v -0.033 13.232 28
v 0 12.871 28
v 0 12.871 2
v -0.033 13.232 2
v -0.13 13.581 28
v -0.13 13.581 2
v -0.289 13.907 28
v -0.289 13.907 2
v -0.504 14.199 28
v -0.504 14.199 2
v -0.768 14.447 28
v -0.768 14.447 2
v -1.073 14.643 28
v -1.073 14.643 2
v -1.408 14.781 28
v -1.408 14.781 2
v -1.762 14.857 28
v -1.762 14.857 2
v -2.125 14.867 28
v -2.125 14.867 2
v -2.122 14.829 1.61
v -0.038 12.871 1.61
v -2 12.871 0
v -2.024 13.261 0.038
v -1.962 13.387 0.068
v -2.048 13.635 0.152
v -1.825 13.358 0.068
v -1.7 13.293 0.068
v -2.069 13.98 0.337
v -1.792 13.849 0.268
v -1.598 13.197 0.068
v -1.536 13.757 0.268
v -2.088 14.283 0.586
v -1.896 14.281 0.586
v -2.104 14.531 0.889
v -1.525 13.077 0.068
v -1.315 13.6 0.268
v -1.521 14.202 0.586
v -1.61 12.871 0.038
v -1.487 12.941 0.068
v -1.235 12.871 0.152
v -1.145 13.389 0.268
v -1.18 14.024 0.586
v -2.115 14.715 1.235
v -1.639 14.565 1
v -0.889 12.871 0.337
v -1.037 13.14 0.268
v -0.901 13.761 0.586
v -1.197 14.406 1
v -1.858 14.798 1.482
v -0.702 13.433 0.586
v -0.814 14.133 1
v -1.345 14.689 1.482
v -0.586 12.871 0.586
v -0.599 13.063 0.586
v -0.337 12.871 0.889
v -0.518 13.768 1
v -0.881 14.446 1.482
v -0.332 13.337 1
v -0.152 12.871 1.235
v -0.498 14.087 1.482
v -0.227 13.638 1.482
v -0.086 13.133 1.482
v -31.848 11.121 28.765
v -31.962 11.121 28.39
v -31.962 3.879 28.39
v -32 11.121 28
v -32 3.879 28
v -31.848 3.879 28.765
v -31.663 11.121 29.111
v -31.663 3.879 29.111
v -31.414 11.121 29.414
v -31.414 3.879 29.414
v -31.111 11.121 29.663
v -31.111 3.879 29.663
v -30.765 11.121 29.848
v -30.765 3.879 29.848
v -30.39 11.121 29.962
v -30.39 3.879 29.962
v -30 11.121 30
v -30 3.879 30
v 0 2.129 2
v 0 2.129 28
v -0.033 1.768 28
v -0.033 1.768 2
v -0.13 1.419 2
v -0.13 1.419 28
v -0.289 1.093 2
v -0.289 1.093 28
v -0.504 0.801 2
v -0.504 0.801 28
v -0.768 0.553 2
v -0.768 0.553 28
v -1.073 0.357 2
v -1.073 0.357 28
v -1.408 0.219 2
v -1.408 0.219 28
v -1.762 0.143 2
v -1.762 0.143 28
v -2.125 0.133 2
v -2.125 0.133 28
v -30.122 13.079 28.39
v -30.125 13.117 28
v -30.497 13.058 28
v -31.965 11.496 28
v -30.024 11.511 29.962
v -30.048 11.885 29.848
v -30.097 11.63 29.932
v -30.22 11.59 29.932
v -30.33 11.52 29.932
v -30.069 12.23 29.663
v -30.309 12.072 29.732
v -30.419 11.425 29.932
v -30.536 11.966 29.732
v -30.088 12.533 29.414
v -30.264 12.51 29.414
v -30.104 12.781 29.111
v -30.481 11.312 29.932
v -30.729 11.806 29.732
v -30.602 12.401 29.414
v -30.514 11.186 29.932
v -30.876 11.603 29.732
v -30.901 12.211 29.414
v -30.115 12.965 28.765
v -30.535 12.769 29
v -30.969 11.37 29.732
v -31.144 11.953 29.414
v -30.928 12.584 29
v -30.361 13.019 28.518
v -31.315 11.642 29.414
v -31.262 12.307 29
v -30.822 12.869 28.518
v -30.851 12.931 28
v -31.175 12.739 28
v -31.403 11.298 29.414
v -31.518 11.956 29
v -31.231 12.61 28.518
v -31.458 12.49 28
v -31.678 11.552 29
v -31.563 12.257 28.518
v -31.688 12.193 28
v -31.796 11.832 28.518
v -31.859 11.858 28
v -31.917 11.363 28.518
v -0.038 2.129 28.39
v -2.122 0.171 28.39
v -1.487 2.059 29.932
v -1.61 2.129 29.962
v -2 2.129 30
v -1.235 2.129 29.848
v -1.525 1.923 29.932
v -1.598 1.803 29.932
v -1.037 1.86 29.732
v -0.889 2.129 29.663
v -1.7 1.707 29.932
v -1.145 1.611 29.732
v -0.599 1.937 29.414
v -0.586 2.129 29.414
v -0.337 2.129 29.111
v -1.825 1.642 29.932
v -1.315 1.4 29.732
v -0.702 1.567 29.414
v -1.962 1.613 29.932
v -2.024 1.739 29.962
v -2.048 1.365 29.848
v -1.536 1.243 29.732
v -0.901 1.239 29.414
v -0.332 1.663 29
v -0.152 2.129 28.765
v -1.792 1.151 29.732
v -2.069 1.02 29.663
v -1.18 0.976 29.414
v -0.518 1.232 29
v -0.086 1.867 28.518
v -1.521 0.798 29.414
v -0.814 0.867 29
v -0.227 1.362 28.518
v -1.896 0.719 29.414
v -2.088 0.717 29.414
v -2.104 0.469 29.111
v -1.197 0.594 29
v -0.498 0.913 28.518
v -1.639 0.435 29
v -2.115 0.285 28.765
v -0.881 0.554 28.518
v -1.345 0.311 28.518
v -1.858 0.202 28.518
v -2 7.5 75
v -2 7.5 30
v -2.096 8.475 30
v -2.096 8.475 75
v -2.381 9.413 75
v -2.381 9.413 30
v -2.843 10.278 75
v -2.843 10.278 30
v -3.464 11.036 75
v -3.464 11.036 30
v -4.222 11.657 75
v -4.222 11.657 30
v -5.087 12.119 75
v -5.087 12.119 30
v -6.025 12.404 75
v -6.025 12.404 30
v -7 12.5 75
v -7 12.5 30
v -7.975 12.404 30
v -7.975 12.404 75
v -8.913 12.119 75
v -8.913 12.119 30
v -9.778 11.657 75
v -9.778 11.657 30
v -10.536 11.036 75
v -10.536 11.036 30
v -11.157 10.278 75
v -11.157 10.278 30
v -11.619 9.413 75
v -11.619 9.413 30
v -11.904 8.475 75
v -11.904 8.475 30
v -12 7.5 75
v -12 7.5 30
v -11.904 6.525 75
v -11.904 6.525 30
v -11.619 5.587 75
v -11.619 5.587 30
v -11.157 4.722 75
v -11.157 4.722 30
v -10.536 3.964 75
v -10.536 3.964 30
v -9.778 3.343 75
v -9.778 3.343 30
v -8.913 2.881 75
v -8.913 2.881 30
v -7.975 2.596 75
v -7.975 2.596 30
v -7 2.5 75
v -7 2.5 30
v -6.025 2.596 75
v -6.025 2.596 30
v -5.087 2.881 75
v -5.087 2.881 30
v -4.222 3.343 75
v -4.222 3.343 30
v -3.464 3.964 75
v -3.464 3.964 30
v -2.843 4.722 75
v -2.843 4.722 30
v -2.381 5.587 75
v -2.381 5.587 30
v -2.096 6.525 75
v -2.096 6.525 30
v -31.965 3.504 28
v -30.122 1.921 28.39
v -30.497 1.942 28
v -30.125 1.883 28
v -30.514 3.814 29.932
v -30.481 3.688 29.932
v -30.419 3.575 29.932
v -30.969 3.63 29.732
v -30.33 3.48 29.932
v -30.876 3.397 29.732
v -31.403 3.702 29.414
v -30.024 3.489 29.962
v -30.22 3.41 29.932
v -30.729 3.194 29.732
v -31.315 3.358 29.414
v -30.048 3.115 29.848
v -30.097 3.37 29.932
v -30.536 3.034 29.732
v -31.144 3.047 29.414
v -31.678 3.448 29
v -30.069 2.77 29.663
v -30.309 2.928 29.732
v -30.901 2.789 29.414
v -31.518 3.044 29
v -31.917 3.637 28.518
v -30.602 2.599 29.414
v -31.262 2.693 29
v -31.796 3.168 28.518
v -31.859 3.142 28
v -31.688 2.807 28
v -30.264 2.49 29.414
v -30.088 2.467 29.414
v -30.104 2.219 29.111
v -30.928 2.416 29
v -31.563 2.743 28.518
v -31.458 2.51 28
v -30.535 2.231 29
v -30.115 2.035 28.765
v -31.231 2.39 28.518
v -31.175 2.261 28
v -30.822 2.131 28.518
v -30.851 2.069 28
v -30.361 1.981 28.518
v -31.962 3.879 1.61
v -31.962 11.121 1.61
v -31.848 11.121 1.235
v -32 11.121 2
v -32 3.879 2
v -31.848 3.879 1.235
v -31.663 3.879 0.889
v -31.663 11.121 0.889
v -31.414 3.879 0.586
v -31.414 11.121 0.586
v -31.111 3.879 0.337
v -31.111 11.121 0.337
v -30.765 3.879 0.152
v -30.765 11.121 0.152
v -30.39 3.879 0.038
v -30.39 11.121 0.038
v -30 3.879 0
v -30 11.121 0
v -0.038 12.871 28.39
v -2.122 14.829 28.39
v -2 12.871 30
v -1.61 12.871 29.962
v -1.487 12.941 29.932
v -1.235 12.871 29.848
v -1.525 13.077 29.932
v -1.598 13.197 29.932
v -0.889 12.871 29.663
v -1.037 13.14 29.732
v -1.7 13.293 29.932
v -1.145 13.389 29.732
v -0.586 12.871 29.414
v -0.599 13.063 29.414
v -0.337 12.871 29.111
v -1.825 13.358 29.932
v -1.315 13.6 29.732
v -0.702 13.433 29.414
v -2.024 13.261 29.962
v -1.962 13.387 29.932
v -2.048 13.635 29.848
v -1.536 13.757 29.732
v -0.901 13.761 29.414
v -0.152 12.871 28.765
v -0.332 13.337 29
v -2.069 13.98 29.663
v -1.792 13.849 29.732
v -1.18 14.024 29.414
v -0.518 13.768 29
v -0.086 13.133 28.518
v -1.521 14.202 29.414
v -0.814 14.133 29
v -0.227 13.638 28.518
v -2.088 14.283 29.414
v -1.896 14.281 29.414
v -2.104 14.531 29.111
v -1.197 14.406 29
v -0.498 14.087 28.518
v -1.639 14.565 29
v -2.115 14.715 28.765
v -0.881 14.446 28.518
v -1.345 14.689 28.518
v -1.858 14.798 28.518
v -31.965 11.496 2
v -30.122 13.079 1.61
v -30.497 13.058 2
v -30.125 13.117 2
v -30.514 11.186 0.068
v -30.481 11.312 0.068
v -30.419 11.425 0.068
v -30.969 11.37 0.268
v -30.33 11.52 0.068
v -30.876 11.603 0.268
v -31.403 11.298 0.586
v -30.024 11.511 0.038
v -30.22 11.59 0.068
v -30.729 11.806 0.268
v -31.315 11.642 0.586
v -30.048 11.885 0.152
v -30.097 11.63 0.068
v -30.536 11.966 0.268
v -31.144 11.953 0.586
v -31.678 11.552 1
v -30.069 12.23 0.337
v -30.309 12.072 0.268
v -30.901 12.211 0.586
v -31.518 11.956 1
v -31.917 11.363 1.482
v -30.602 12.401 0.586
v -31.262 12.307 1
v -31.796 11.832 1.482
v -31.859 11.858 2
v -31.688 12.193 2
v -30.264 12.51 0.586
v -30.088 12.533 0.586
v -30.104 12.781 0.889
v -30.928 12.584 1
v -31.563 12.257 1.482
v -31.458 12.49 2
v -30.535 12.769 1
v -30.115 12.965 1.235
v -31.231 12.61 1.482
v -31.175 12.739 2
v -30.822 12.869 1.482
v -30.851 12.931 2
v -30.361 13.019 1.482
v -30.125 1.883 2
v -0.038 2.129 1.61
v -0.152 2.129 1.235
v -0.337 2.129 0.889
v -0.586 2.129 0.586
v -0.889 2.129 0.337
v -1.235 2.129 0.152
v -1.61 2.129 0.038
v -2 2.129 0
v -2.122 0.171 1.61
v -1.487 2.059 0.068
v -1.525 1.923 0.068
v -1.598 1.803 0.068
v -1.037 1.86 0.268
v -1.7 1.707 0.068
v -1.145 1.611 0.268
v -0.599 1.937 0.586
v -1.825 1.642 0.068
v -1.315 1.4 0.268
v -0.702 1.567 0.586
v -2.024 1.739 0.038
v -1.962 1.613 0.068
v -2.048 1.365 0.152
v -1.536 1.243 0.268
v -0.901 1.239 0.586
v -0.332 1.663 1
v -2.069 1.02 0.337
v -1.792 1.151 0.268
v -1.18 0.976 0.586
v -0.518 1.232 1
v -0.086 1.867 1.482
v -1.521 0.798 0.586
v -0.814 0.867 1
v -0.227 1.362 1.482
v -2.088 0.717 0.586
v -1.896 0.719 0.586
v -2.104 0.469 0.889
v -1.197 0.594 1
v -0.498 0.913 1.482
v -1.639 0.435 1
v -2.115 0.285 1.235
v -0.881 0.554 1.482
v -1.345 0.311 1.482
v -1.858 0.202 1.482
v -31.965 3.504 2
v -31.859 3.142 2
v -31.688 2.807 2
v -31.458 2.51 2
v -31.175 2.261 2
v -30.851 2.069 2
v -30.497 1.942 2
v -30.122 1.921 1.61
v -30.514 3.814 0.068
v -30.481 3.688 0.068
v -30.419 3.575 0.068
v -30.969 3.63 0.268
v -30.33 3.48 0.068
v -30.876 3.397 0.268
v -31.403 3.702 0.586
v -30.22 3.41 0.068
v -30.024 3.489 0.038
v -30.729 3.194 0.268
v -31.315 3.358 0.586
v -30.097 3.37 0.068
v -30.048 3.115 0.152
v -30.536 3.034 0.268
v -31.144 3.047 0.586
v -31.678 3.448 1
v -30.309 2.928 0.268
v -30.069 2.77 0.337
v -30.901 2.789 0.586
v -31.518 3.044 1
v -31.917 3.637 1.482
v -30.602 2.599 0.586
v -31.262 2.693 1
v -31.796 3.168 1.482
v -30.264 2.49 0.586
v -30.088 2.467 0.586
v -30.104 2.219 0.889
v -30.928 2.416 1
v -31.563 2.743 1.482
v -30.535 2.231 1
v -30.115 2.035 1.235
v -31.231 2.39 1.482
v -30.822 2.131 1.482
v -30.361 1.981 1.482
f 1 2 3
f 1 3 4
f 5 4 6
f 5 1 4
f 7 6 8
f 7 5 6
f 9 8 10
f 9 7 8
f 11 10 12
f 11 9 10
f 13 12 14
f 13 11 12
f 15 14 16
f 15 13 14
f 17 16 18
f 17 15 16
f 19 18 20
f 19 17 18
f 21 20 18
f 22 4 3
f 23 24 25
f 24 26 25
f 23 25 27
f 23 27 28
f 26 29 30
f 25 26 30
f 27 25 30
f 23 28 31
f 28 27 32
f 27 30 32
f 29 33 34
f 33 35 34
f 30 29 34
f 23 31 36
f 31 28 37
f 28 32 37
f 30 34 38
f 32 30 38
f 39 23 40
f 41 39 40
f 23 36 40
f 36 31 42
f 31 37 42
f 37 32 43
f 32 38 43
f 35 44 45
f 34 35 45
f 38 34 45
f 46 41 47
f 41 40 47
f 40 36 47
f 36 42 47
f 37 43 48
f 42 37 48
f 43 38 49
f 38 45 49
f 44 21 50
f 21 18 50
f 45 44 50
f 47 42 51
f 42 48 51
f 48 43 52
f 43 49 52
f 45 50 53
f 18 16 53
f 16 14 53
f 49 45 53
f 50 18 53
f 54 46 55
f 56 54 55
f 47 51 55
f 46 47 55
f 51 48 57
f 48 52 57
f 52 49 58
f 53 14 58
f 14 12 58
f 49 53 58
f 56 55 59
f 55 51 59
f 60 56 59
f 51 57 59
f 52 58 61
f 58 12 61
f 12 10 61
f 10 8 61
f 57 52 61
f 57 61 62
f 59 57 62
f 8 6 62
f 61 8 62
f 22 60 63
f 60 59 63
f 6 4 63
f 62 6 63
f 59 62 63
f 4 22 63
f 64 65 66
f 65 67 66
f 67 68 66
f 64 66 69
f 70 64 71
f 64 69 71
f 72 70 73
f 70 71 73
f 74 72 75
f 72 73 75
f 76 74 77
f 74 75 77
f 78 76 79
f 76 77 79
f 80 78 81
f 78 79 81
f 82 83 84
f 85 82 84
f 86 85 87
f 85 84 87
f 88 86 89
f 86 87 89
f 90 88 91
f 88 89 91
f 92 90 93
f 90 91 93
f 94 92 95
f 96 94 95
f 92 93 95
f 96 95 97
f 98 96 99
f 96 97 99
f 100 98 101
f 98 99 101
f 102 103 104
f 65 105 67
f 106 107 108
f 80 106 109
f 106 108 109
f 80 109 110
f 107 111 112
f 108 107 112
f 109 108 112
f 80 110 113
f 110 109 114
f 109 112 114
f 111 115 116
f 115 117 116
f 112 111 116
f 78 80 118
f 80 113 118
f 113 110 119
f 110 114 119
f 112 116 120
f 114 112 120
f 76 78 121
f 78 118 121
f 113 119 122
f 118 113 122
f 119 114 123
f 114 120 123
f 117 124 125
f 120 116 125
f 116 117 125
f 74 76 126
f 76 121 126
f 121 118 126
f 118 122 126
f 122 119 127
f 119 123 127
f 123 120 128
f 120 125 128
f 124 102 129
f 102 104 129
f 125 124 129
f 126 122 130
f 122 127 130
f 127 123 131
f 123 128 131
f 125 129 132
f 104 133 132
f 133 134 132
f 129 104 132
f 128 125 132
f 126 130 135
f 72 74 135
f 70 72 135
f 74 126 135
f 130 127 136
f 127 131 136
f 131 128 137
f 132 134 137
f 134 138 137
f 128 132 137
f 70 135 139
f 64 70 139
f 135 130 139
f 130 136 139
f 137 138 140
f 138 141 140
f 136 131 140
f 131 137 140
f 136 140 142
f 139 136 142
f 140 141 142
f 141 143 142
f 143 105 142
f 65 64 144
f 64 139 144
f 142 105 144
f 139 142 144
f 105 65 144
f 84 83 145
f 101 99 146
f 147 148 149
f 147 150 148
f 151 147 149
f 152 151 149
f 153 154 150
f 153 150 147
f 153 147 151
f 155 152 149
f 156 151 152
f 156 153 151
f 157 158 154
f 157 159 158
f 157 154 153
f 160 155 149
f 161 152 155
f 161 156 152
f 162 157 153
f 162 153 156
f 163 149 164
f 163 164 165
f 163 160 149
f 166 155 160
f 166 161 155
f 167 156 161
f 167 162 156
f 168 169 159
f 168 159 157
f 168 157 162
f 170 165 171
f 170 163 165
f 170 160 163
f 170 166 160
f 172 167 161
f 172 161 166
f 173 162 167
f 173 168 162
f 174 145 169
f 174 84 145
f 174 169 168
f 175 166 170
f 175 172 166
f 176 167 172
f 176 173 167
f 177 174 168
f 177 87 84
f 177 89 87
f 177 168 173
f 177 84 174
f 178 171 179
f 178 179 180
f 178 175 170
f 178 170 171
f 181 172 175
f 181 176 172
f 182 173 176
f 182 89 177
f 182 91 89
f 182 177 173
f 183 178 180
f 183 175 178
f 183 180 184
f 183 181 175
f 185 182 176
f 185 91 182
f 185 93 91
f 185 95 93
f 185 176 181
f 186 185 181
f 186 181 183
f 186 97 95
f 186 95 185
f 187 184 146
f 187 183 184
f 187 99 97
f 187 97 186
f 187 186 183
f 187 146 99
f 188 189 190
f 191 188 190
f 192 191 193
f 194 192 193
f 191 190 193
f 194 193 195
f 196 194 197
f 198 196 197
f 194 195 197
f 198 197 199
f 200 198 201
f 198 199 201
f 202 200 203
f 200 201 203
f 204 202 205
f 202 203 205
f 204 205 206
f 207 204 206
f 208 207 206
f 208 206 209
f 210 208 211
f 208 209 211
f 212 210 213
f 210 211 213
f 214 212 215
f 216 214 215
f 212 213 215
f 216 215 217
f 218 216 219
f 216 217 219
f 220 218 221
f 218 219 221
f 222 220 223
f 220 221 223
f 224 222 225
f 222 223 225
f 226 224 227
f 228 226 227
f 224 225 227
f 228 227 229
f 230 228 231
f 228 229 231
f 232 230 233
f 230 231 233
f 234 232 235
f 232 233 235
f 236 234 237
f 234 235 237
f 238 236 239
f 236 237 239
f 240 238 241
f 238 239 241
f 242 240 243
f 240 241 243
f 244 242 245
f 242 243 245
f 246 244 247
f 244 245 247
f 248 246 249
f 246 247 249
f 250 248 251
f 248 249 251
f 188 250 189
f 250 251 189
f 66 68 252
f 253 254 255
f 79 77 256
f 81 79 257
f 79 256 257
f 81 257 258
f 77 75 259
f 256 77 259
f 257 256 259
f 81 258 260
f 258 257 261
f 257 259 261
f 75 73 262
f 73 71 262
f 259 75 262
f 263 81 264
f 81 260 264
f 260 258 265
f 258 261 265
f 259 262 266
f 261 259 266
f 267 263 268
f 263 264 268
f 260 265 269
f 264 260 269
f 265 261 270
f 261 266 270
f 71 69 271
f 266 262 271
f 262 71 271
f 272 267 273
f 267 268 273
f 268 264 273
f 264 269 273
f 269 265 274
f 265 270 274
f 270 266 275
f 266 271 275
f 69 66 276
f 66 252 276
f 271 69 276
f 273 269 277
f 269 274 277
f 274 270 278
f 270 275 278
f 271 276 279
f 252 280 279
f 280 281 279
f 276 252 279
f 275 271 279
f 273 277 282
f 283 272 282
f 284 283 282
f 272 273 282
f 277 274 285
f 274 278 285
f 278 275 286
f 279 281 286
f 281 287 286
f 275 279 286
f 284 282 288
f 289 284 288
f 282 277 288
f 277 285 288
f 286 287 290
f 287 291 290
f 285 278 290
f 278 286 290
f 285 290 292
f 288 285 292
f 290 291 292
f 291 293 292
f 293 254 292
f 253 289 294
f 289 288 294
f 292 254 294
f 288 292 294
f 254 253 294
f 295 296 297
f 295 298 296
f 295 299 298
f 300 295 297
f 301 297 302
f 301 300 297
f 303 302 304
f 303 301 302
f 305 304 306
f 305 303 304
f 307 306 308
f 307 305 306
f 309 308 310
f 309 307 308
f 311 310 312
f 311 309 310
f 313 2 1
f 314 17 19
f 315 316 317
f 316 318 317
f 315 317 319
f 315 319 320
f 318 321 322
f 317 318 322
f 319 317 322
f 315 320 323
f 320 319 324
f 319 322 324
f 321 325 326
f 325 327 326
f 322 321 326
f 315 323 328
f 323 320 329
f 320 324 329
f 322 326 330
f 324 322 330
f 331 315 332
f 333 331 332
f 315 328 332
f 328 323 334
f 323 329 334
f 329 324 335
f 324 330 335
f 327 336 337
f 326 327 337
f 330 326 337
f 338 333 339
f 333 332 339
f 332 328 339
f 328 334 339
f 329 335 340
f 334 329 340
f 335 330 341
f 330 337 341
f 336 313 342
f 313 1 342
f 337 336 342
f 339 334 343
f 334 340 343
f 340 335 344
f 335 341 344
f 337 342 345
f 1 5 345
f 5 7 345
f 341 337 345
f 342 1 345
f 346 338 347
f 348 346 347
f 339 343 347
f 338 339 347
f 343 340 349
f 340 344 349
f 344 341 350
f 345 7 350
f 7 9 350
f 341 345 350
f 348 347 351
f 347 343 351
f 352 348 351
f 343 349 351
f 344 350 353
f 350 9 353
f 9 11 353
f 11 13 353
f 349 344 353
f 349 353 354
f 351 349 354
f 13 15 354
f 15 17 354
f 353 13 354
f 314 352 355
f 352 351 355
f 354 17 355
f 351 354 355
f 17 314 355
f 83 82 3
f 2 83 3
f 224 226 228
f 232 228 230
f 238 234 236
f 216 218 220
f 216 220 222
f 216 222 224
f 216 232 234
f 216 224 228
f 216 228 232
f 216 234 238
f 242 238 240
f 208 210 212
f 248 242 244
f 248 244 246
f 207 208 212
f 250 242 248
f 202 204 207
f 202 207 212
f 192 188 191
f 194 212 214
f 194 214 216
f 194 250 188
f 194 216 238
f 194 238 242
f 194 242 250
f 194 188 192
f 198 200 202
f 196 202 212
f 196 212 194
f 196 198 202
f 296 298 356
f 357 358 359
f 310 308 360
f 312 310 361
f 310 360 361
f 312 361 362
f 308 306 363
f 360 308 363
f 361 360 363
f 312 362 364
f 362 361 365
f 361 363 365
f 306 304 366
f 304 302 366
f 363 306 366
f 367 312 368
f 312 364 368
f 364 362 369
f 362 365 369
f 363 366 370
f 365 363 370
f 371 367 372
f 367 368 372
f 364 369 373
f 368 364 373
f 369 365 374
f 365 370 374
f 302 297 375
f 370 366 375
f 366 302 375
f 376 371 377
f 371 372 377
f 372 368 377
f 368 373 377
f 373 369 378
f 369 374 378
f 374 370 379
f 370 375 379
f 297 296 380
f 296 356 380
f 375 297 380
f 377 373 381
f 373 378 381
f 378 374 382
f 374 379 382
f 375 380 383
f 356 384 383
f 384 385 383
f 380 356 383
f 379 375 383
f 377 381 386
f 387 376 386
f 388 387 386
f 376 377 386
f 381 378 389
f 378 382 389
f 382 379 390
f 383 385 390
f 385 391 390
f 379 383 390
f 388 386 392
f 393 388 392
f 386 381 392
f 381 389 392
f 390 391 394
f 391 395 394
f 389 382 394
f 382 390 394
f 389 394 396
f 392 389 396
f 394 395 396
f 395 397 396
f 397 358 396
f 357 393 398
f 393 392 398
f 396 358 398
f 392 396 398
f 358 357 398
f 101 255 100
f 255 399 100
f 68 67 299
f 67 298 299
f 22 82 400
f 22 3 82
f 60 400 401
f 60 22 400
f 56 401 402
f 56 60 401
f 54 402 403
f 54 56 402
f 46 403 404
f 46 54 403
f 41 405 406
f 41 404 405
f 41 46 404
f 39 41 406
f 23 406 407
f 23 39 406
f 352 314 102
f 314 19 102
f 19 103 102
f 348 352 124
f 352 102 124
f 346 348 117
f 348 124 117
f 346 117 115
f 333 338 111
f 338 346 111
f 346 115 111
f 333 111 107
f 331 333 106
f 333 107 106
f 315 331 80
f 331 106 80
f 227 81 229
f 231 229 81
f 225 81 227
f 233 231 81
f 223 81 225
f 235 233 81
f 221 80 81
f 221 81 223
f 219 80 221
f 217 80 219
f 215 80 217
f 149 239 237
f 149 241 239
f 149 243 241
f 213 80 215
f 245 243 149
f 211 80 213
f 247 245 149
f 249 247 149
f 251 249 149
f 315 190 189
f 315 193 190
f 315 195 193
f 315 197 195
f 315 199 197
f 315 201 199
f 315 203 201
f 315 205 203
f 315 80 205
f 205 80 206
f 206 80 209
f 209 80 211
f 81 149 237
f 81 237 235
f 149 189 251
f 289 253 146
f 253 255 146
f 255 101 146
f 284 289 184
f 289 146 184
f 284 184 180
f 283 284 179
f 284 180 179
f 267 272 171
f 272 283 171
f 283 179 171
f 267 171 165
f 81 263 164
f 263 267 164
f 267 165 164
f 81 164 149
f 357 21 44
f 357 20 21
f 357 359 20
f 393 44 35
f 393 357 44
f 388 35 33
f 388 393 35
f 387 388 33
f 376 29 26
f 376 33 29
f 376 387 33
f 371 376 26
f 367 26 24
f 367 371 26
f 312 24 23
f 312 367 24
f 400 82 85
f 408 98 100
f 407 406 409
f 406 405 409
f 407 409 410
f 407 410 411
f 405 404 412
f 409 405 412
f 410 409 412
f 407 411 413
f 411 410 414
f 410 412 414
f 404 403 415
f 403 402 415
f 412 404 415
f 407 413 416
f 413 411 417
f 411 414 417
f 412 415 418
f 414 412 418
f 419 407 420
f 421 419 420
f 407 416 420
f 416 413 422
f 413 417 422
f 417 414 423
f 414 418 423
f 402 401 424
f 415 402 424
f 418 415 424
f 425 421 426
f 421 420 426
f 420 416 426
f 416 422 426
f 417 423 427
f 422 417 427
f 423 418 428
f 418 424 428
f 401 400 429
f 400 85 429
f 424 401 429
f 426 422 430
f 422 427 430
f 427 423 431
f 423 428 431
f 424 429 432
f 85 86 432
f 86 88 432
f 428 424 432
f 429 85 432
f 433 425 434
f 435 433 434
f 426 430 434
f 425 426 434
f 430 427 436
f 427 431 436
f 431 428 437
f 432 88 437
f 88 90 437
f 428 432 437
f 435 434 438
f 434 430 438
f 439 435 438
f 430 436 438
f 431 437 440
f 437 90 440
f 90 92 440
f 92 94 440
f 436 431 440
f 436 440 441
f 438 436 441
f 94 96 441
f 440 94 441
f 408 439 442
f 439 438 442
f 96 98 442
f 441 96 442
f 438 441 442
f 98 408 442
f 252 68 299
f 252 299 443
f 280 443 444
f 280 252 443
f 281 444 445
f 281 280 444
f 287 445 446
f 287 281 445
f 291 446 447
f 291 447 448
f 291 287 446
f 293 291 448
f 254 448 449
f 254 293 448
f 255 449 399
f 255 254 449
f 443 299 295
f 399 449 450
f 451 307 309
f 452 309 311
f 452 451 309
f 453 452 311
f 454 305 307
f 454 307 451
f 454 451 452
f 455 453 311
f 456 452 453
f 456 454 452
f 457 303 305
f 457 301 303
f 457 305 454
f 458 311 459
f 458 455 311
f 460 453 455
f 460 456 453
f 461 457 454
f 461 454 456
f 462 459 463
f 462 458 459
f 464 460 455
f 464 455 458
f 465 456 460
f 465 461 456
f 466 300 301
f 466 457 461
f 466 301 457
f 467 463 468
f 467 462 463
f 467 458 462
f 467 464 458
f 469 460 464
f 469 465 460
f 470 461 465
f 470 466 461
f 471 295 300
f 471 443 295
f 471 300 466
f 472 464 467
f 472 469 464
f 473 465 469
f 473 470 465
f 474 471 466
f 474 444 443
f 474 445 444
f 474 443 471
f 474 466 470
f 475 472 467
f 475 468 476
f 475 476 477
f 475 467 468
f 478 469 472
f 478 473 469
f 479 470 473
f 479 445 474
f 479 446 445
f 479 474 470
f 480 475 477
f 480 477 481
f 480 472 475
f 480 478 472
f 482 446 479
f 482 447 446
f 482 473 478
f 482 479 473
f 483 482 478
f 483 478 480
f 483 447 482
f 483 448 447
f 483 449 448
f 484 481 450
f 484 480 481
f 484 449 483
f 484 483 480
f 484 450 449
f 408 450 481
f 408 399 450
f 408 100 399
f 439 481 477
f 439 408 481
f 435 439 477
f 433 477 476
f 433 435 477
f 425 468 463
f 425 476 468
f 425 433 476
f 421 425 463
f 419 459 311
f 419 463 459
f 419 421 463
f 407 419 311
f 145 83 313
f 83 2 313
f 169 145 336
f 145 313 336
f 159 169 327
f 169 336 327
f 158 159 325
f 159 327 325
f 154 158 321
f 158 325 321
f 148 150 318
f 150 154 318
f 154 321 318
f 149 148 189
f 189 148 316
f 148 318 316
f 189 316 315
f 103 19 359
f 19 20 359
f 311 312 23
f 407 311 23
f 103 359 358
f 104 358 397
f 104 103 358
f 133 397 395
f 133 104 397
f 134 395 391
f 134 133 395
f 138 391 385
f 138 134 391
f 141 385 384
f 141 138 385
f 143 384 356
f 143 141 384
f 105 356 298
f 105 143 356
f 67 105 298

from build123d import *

# Parameters (mm, degrees)
RESSALTO_EXTRUS_O1_DEPTH = 30
FILETE1_R                = 2
ESBO_O4_R                = 5
RESSALTO_EXTRUS_O2_DEPTH = 45


with BuildPart() as part:
    # Esboço2 → Ressalto-extrusão1 (new body)
    with BuildSketch(Plane.XY):
        Polygon((0, 0), (0, 15), (-32, 13), (-32, 2), align=None)
    extrude(amount=RESSALTO_EXTRUS_O1_DEPTH)

    # Filete1
    filete1_edges = [part.edges().sort_by_distance(p)[0] for p in [
        (-16, 14, 30),
        (-32, 7.5, 30),
        (-16, 1, 30),
        (-32, 7.5, 0),
        (-16, 14, 0),
        (0, 7.5, 0),
        (-16, 1, 0),
        (-32, 2, 15),
        (-32, 13, 15),
        (0, 15, 15),
        (0, 0, 15),
        (0, 7.5, 30),
    ]]
    fillet(filete1_edges, radius=FILETE1_R)

    # Esboço4 → Ressalto-extrusão2 (add)
    with BuildSketch(Plane.XY.offset(30)):
        with Locations((-7, 7.5)):
            Circle(ESBO_O4_R)
    extrude(amount=RESSALTO_EXTRUS_O2_DEPTH)


solid = part.part
